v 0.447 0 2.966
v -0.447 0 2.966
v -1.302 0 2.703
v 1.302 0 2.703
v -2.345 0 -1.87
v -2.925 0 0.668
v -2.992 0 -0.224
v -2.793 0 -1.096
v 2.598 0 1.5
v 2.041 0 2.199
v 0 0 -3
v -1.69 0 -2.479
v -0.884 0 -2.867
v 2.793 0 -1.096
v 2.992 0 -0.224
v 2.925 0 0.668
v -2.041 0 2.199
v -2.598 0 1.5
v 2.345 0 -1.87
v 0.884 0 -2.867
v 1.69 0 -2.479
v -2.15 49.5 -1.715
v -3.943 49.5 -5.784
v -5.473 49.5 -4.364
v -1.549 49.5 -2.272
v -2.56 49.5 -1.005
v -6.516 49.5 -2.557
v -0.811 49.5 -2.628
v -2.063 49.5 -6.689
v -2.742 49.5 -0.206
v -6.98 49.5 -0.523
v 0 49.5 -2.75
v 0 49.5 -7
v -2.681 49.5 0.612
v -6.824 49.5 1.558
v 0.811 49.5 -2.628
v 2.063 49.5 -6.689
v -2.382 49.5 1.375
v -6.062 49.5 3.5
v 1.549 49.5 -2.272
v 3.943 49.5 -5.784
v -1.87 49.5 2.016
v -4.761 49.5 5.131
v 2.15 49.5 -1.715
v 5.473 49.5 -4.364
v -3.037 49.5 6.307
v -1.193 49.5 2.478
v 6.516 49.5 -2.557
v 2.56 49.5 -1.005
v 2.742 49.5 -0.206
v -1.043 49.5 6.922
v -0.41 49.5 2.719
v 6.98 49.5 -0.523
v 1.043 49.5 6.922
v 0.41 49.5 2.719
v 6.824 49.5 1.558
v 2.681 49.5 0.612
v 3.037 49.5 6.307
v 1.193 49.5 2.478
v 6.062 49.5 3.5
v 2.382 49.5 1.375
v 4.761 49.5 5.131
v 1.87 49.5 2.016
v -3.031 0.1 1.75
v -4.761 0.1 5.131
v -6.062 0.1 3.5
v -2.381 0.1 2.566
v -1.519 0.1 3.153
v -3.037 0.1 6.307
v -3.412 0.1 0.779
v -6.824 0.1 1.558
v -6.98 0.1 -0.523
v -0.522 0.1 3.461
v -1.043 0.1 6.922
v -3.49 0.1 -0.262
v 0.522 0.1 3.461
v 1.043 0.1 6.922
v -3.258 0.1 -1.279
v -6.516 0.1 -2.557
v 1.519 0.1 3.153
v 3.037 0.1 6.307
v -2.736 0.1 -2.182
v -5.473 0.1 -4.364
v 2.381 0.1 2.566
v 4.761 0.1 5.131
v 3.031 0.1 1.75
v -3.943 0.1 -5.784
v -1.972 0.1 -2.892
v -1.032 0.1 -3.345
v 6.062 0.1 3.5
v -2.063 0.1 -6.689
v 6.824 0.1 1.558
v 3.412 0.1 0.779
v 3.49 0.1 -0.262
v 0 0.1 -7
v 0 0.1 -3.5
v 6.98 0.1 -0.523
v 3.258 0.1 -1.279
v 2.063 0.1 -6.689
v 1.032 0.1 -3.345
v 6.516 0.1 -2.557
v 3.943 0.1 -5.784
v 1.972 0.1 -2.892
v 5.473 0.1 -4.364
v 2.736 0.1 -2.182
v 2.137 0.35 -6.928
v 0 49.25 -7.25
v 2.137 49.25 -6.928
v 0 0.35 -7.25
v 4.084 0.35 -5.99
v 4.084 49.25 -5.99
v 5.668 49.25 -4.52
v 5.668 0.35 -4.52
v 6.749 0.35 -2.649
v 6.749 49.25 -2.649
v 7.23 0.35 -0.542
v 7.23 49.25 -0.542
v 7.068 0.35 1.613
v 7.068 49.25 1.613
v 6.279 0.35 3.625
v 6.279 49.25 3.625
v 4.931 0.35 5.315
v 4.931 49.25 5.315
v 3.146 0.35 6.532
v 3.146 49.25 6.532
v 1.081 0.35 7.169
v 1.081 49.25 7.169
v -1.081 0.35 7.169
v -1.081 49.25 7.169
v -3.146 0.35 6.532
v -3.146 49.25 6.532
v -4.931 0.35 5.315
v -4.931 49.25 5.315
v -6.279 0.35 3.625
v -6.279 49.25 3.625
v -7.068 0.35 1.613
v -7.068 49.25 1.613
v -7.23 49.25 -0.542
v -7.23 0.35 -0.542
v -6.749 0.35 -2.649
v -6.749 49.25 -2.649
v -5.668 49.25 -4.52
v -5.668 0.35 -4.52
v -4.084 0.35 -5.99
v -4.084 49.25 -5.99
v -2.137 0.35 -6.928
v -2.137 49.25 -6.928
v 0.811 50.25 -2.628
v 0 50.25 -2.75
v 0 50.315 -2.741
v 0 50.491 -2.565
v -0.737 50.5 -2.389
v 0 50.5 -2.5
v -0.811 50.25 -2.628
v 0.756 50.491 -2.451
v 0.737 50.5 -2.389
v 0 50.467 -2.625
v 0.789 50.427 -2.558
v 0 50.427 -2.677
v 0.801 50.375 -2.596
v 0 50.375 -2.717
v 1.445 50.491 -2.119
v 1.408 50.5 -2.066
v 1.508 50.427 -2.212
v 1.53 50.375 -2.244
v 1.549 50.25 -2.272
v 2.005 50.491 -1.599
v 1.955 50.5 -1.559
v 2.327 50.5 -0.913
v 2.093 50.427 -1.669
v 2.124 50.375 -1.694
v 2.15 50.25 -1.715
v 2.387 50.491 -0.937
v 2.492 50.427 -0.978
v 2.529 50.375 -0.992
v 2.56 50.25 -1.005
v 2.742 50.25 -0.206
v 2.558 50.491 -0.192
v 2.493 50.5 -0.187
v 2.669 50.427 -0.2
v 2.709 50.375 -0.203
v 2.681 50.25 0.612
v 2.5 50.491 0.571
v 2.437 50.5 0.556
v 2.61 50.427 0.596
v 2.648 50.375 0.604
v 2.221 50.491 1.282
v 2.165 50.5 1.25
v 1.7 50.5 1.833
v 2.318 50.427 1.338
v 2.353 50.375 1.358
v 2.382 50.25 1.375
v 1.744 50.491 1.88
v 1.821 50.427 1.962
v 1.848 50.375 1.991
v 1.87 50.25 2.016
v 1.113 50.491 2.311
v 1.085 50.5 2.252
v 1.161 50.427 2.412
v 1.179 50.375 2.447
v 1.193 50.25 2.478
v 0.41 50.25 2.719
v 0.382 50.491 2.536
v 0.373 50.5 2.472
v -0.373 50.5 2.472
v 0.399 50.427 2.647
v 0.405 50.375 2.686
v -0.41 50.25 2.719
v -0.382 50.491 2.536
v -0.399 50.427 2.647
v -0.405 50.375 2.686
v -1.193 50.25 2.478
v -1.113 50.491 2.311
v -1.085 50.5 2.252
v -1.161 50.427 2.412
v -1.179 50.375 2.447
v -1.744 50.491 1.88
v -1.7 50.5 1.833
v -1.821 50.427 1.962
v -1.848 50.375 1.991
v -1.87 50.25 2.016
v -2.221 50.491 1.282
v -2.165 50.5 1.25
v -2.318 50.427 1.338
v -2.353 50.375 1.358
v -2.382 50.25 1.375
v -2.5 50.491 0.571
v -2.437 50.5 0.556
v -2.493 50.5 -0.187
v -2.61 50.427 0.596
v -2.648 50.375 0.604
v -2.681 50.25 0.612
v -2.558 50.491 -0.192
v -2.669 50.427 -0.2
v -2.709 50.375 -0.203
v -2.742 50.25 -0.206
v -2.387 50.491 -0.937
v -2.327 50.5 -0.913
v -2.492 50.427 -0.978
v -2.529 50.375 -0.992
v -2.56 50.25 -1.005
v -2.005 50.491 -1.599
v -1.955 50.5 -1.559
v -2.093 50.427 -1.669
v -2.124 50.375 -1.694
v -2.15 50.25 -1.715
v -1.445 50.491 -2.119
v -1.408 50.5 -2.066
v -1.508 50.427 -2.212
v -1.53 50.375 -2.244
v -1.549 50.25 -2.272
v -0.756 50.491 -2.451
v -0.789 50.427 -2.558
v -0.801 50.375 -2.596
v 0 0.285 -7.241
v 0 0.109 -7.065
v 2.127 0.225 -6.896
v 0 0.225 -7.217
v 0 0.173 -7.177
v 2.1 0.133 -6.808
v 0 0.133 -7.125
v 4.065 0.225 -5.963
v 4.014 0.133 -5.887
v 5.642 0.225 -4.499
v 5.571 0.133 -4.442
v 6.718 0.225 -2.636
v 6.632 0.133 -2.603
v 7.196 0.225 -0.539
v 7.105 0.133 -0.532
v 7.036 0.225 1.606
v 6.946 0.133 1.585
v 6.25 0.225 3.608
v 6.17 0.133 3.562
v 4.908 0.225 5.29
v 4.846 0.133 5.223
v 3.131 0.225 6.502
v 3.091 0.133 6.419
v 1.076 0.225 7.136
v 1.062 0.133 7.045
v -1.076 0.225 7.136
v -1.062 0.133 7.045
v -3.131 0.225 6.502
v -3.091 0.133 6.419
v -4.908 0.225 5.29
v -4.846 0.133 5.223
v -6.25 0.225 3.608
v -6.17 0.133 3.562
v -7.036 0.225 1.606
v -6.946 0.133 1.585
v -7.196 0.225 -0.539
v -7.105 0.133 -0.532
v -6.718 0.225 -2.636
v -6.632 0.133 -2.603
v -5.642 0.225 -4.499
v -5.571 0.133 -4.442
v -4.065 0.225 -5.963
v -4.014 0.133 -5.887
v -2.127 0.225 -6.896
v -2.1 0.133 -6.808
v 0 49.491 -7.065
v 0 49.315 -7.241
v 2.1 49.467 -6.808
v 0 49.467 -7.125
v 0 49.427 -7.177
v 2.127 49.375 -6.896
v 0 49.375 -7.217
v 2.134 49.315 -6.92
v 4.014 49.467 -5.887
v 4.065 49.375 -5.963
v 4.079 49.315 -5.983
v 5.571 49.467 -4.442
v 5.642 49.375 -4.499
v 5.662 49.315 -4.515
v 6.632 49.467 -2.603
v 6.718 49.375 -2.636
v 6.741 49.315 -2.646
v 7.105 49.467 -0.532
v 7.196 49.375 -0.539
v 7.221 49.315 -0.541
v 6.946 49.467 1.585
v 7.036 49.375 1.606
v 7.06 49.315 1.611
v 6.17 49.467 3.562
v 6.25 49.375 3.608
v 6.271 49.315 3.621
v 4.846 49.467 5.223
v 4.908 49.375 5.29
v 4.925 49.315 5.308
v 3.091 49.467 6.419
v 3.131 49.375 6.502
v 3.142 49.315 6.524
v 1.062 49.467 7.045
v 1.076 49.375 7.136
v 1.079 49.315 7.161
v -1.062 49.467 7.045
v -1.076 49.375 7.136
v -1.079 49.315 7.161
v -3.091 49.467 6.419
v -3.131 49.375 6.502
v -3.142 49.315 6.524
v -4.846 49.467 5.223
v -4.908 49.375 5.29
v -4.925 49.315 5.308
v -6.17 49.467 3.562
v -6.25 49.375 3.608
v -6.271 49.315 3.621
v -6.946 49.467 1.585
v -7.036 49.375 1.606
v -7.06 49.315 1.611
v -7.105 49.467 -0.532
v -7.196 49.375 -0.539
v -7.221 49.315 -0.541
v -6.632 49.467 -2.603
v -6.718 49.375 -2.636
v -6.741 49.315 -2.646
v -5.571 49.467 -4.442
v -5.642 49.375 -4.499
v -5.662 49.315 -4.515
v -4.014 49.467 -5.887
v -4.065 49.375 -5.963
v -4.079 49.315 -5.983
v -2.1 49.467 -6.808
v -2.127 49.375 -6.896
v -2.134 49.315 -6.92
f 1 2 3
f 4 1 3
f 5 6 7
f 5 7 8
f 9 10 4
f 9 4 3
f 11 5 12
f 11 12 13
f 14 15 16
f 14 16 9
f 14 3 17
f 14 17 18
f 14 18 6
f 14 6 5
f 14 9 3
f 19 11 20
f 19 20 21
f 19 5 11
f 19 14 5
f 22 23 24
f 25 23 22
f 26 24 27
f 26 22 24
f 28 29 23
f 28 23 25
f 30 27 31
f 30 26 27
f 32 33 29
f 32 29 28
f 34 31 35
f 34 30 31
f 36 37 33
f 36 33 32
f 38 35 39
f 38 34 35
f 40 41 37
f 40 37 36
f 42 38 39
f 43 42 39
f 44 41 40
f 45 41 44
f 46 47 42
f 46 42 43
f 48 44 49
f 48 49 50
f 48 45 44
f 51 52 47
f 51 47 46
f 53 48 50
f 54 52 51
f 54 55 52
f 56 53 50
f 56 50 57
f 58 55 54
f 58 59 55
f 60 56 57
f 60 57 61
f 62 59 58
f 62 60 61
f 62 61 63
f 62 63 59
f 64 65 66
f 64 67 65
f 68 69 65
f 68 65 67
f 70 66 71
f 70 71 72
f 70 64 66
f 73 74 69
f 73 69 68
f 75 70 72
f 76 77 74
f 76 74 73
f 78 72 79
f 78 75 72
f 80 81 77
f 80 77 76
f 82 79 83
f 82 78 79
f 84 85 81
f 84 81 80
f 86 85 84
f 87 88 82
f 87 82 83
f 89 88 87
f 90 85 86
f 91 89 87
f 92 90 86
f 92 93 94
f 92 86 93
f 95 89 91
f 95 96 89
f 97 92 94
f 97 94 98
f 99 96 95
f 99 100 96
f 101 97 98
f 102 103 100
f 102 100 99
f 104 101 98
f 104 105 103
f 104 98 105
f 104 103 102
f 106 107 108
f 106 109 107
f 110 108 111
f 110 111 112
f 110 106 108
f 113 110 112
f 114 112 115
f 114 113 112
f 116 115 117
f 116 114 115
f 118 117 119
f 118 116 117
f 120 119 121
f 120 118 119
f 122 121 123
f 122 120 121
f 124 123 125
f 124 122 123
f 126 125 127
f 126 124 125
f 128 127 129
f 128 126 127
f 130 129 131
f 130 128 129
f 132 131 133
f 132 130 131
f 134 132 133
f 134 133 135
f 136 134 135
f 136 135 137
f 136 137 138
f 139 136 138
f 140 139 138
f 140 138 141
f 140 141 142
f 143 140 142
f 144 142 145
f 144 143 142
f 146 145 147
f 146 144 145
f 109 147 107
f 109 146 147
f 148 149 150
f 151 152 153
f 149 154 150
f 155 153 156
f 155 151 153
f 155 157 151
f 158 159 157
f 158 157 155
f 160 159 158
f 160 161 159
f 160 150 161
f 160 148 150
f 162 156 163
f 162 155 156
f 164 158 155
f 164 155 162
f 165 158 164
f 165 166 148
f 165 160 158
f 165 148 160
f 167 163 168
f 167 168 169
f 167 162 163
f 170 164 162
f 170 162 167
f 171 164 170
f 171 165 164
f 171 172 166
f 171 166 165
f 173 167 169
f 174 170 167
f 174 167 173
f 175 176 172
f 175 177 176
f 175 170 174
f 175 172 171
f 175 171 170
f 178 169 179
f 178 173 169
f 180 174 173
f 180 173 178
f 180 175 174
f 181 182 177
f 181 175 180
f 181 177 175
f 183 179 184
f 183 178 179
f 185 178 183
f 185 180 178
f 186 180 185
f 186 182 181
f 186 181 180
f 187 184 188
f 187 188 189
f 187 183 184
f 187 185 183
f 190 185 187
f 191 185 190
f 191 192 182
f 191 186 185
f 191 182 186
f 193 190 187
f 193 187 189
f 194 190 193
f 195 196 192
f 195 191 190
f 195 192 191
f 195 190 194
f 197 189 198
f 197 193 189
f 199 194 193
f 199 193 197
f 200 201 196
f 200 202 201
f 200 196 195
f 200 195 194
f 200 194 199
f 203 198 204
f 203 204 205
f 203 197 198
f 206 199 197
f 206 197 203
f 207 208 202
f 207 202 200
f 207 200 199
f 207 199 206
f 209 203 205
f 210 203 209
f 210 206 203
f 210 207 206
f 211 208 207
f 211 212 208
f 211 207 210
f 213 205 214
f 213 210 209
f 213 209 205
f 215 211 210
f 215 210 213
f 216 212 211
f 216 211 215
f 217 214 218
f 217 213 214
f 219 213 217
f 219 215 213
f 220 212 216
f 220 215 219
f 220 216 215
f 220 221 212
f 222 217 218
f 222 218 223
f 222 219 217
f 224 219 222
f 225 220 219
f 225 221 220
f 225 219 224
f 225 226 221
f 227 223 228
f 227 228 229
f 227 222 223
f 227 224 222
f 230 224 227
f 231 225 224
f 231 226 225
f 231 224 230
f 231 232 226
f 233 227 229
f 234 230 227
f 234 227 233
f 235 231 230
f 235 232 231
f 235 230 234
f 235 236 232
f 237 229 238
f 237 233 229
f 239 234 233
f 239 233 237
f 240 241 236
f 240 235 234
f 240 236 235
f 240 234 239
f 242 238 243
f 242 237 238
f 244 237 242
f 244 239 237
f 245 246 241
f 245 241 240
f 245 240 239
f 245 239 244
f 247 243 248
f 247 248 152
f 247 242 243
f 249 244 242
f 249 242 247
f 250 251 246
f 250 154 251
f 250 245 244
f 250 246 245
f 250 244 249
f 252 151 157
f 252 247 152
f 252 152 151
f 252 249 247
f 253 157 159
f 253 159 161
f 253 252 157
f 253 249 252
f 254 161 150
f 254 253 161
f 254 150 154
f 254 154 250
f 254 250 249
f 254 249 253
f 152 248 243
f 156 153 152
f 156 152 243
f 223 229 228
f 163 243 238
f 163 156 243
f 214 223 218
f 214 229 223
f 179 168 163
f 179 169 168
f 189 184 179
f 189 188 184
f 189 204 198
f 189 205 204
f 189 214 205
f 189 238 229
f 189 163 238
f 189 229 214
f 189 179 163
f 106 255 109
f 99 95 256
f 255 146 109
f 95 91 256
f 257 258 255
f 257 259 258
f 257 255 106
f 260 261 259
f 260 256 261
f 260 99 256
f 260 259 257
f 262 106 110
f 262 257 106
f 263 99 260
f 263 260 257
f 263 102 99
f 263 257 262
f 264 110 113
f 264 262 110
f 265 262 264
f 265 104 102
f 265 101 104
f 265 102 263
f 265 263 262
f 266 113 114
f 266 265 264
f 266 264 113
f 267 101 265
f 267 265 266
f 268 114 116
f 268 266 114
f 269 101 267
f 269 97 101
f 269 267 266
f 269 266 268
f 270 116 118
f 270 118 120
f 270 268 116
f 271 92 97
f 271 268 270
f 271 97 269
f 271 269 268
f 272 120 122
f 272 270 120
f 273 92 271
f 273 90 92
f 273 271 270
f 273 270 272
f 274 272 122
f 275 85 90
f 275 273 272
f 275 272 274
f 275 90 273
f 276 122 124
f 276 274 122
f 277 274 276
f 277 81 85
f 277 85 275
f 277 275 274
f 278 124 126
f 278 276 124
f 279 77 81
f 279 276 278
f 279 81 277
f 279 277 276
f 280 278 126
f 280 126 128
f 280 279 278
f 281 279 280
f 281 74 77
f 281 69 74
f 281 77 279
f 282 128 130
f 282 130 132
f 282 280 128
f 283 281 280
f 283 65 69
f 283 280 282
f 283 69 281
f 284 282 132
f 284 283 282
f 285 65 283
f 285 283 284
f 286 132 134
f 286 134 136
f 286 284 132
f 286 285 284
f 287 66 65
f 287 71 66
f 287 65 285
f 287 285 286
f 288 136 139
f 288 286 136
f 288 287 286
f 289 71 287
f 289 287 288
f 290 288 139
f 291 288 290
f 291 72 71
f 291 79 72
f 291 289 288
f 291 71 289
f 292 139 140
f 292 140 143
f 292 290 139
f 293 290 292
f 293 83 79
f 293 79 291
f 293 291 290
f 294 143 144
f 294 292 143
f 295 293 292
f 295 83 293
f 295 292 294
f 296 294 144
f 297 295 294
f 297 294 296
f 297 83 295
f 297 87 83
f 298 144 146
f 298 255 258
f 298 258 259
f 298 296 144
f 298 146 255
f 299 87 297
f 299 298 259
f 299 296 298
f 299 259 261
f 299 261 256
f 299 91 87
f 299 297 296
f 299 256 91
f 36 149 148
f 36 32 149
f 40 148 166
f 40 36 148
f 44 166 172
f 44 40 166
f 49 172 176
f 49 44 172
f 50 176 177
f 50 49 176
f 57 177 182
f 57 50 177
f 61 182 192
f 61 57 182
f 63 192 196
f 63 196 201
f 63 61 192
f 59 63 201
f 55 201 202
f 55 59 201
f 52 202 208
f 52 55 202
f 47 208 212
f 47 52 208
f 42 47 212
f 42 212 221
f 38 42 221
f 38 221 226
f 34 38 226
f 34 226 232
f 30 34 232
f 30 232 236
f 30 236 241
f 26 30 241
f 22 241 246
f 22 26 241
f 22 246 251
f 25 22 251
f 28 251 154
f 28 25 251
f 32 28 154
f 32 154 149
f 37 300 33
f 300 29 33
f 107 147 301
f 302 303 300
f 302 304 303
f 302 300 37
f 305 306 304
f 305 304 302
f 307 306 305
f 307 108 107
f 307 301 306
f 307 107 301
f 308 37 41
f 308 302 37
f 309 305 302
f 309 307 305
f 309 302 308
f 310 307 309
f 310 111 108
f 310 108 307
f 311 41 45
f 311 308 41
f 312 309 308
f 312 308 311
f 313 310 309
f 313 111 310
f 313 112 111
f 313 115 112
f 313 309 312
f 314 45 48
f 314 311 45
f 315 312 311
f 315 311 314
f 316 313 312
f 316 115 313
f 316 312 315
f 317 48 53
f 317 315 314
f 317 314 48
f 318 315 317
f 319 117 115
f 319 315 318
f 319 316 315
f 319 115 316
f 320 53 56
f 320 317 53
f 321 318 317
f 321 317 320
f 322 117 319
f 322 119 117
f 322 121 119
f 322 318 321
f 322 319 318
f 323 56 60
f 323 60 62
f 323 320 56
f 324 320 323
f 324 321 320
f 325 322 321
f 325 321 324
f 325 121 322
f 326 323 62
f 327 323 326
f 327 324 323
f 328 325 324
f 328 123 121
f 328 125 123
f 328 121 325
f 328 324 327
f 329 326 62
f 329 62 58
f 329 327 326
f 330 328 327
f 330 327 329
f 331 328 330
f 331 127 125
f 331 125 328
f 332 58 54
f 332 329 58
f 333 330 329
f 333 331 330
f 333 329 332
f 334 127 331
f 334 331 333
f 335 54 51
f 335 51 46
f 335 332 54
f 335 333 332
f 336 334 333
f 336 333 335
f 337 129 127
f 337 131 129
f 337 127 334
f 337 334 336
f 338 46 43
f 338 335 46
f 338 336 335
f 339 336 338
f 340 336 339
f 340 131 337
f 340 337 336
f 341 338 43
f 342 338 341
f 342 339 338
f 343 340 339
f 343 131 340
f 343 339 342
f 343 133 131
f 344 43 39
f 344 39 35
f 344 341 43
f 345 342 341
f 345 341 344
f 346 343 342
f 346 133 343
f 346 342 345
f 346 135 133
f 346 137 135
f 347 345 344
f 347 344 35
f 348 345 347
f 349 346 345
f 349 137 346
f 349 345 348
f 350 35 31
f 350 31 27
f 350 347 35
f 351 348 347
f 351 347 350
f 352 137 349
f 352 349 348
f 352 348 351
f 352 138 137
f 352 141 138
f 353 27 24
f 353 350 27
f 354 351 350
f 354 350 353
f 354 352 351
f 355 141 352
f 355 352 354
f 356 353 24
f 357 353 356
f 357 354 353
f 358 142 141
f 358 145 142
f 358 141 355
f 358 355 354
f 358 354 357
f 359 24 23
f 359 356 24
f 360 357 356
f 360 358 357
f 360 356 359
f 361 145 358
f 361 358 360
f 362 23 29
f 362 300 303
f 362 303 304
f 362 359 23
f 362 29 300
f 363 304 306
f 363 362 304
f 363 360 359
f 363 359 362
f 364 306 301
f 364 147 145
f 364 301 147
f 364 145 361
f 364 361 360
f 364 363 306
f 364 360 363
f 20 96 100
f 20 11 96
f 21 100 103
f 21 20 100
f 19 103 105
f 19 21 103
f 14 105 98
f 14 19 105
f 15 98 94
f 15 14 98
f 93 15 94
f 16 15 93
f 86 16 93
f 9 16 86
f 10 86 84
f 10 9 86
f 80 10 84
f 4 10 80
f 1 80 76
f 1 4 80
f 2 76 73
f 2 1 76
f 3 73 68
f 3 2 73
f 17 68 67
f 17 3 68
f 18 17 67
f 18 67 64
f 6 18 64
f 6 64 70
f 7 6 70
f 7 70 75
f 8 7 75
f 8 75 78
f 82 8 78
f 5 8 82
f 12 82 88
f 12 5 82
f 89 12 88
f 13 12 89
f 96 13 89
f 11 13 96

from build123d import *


with BuildPart() as part:
    # Sketch2 → Revolve1 (revolve)
    with BuildSketch(Plane(origin=(0, 0, 0), x_dir=(0, 0, -1), z_dir=(1, 0, 0))):
        with BuildLine():
            Line((0, 0), (0, 50.5))
            Line((0, 50.5), (2.5, 50.5))
            ThreePointArc((2.5, 50.5), (2.676776695, 50.426776695), (2.75, 50.25))
            Line((2.75, 50.25), (2.75, 49.5))
            Line((2.75, 49.5), (7, 49.5))
            ThreePointArc((7, 49.5), (7.176776695, 49.426776695), (7.25, 49.25))
            Line((7.25, 49.25), (7.25, 0.35))
            ThreePointArc((7.25, 0.35), (7.176776695, 0.173223305), (7, 0.1))
            Line((7, 0.1), (3.5, 0.1))
            Line((3.5, 0.1), (3, 0))
            Line((3, 0), (0, 0))
        make_face()
    revolve(axis=Axis((0, 0, 0), (0, -1, 0)))


solid = part.part
